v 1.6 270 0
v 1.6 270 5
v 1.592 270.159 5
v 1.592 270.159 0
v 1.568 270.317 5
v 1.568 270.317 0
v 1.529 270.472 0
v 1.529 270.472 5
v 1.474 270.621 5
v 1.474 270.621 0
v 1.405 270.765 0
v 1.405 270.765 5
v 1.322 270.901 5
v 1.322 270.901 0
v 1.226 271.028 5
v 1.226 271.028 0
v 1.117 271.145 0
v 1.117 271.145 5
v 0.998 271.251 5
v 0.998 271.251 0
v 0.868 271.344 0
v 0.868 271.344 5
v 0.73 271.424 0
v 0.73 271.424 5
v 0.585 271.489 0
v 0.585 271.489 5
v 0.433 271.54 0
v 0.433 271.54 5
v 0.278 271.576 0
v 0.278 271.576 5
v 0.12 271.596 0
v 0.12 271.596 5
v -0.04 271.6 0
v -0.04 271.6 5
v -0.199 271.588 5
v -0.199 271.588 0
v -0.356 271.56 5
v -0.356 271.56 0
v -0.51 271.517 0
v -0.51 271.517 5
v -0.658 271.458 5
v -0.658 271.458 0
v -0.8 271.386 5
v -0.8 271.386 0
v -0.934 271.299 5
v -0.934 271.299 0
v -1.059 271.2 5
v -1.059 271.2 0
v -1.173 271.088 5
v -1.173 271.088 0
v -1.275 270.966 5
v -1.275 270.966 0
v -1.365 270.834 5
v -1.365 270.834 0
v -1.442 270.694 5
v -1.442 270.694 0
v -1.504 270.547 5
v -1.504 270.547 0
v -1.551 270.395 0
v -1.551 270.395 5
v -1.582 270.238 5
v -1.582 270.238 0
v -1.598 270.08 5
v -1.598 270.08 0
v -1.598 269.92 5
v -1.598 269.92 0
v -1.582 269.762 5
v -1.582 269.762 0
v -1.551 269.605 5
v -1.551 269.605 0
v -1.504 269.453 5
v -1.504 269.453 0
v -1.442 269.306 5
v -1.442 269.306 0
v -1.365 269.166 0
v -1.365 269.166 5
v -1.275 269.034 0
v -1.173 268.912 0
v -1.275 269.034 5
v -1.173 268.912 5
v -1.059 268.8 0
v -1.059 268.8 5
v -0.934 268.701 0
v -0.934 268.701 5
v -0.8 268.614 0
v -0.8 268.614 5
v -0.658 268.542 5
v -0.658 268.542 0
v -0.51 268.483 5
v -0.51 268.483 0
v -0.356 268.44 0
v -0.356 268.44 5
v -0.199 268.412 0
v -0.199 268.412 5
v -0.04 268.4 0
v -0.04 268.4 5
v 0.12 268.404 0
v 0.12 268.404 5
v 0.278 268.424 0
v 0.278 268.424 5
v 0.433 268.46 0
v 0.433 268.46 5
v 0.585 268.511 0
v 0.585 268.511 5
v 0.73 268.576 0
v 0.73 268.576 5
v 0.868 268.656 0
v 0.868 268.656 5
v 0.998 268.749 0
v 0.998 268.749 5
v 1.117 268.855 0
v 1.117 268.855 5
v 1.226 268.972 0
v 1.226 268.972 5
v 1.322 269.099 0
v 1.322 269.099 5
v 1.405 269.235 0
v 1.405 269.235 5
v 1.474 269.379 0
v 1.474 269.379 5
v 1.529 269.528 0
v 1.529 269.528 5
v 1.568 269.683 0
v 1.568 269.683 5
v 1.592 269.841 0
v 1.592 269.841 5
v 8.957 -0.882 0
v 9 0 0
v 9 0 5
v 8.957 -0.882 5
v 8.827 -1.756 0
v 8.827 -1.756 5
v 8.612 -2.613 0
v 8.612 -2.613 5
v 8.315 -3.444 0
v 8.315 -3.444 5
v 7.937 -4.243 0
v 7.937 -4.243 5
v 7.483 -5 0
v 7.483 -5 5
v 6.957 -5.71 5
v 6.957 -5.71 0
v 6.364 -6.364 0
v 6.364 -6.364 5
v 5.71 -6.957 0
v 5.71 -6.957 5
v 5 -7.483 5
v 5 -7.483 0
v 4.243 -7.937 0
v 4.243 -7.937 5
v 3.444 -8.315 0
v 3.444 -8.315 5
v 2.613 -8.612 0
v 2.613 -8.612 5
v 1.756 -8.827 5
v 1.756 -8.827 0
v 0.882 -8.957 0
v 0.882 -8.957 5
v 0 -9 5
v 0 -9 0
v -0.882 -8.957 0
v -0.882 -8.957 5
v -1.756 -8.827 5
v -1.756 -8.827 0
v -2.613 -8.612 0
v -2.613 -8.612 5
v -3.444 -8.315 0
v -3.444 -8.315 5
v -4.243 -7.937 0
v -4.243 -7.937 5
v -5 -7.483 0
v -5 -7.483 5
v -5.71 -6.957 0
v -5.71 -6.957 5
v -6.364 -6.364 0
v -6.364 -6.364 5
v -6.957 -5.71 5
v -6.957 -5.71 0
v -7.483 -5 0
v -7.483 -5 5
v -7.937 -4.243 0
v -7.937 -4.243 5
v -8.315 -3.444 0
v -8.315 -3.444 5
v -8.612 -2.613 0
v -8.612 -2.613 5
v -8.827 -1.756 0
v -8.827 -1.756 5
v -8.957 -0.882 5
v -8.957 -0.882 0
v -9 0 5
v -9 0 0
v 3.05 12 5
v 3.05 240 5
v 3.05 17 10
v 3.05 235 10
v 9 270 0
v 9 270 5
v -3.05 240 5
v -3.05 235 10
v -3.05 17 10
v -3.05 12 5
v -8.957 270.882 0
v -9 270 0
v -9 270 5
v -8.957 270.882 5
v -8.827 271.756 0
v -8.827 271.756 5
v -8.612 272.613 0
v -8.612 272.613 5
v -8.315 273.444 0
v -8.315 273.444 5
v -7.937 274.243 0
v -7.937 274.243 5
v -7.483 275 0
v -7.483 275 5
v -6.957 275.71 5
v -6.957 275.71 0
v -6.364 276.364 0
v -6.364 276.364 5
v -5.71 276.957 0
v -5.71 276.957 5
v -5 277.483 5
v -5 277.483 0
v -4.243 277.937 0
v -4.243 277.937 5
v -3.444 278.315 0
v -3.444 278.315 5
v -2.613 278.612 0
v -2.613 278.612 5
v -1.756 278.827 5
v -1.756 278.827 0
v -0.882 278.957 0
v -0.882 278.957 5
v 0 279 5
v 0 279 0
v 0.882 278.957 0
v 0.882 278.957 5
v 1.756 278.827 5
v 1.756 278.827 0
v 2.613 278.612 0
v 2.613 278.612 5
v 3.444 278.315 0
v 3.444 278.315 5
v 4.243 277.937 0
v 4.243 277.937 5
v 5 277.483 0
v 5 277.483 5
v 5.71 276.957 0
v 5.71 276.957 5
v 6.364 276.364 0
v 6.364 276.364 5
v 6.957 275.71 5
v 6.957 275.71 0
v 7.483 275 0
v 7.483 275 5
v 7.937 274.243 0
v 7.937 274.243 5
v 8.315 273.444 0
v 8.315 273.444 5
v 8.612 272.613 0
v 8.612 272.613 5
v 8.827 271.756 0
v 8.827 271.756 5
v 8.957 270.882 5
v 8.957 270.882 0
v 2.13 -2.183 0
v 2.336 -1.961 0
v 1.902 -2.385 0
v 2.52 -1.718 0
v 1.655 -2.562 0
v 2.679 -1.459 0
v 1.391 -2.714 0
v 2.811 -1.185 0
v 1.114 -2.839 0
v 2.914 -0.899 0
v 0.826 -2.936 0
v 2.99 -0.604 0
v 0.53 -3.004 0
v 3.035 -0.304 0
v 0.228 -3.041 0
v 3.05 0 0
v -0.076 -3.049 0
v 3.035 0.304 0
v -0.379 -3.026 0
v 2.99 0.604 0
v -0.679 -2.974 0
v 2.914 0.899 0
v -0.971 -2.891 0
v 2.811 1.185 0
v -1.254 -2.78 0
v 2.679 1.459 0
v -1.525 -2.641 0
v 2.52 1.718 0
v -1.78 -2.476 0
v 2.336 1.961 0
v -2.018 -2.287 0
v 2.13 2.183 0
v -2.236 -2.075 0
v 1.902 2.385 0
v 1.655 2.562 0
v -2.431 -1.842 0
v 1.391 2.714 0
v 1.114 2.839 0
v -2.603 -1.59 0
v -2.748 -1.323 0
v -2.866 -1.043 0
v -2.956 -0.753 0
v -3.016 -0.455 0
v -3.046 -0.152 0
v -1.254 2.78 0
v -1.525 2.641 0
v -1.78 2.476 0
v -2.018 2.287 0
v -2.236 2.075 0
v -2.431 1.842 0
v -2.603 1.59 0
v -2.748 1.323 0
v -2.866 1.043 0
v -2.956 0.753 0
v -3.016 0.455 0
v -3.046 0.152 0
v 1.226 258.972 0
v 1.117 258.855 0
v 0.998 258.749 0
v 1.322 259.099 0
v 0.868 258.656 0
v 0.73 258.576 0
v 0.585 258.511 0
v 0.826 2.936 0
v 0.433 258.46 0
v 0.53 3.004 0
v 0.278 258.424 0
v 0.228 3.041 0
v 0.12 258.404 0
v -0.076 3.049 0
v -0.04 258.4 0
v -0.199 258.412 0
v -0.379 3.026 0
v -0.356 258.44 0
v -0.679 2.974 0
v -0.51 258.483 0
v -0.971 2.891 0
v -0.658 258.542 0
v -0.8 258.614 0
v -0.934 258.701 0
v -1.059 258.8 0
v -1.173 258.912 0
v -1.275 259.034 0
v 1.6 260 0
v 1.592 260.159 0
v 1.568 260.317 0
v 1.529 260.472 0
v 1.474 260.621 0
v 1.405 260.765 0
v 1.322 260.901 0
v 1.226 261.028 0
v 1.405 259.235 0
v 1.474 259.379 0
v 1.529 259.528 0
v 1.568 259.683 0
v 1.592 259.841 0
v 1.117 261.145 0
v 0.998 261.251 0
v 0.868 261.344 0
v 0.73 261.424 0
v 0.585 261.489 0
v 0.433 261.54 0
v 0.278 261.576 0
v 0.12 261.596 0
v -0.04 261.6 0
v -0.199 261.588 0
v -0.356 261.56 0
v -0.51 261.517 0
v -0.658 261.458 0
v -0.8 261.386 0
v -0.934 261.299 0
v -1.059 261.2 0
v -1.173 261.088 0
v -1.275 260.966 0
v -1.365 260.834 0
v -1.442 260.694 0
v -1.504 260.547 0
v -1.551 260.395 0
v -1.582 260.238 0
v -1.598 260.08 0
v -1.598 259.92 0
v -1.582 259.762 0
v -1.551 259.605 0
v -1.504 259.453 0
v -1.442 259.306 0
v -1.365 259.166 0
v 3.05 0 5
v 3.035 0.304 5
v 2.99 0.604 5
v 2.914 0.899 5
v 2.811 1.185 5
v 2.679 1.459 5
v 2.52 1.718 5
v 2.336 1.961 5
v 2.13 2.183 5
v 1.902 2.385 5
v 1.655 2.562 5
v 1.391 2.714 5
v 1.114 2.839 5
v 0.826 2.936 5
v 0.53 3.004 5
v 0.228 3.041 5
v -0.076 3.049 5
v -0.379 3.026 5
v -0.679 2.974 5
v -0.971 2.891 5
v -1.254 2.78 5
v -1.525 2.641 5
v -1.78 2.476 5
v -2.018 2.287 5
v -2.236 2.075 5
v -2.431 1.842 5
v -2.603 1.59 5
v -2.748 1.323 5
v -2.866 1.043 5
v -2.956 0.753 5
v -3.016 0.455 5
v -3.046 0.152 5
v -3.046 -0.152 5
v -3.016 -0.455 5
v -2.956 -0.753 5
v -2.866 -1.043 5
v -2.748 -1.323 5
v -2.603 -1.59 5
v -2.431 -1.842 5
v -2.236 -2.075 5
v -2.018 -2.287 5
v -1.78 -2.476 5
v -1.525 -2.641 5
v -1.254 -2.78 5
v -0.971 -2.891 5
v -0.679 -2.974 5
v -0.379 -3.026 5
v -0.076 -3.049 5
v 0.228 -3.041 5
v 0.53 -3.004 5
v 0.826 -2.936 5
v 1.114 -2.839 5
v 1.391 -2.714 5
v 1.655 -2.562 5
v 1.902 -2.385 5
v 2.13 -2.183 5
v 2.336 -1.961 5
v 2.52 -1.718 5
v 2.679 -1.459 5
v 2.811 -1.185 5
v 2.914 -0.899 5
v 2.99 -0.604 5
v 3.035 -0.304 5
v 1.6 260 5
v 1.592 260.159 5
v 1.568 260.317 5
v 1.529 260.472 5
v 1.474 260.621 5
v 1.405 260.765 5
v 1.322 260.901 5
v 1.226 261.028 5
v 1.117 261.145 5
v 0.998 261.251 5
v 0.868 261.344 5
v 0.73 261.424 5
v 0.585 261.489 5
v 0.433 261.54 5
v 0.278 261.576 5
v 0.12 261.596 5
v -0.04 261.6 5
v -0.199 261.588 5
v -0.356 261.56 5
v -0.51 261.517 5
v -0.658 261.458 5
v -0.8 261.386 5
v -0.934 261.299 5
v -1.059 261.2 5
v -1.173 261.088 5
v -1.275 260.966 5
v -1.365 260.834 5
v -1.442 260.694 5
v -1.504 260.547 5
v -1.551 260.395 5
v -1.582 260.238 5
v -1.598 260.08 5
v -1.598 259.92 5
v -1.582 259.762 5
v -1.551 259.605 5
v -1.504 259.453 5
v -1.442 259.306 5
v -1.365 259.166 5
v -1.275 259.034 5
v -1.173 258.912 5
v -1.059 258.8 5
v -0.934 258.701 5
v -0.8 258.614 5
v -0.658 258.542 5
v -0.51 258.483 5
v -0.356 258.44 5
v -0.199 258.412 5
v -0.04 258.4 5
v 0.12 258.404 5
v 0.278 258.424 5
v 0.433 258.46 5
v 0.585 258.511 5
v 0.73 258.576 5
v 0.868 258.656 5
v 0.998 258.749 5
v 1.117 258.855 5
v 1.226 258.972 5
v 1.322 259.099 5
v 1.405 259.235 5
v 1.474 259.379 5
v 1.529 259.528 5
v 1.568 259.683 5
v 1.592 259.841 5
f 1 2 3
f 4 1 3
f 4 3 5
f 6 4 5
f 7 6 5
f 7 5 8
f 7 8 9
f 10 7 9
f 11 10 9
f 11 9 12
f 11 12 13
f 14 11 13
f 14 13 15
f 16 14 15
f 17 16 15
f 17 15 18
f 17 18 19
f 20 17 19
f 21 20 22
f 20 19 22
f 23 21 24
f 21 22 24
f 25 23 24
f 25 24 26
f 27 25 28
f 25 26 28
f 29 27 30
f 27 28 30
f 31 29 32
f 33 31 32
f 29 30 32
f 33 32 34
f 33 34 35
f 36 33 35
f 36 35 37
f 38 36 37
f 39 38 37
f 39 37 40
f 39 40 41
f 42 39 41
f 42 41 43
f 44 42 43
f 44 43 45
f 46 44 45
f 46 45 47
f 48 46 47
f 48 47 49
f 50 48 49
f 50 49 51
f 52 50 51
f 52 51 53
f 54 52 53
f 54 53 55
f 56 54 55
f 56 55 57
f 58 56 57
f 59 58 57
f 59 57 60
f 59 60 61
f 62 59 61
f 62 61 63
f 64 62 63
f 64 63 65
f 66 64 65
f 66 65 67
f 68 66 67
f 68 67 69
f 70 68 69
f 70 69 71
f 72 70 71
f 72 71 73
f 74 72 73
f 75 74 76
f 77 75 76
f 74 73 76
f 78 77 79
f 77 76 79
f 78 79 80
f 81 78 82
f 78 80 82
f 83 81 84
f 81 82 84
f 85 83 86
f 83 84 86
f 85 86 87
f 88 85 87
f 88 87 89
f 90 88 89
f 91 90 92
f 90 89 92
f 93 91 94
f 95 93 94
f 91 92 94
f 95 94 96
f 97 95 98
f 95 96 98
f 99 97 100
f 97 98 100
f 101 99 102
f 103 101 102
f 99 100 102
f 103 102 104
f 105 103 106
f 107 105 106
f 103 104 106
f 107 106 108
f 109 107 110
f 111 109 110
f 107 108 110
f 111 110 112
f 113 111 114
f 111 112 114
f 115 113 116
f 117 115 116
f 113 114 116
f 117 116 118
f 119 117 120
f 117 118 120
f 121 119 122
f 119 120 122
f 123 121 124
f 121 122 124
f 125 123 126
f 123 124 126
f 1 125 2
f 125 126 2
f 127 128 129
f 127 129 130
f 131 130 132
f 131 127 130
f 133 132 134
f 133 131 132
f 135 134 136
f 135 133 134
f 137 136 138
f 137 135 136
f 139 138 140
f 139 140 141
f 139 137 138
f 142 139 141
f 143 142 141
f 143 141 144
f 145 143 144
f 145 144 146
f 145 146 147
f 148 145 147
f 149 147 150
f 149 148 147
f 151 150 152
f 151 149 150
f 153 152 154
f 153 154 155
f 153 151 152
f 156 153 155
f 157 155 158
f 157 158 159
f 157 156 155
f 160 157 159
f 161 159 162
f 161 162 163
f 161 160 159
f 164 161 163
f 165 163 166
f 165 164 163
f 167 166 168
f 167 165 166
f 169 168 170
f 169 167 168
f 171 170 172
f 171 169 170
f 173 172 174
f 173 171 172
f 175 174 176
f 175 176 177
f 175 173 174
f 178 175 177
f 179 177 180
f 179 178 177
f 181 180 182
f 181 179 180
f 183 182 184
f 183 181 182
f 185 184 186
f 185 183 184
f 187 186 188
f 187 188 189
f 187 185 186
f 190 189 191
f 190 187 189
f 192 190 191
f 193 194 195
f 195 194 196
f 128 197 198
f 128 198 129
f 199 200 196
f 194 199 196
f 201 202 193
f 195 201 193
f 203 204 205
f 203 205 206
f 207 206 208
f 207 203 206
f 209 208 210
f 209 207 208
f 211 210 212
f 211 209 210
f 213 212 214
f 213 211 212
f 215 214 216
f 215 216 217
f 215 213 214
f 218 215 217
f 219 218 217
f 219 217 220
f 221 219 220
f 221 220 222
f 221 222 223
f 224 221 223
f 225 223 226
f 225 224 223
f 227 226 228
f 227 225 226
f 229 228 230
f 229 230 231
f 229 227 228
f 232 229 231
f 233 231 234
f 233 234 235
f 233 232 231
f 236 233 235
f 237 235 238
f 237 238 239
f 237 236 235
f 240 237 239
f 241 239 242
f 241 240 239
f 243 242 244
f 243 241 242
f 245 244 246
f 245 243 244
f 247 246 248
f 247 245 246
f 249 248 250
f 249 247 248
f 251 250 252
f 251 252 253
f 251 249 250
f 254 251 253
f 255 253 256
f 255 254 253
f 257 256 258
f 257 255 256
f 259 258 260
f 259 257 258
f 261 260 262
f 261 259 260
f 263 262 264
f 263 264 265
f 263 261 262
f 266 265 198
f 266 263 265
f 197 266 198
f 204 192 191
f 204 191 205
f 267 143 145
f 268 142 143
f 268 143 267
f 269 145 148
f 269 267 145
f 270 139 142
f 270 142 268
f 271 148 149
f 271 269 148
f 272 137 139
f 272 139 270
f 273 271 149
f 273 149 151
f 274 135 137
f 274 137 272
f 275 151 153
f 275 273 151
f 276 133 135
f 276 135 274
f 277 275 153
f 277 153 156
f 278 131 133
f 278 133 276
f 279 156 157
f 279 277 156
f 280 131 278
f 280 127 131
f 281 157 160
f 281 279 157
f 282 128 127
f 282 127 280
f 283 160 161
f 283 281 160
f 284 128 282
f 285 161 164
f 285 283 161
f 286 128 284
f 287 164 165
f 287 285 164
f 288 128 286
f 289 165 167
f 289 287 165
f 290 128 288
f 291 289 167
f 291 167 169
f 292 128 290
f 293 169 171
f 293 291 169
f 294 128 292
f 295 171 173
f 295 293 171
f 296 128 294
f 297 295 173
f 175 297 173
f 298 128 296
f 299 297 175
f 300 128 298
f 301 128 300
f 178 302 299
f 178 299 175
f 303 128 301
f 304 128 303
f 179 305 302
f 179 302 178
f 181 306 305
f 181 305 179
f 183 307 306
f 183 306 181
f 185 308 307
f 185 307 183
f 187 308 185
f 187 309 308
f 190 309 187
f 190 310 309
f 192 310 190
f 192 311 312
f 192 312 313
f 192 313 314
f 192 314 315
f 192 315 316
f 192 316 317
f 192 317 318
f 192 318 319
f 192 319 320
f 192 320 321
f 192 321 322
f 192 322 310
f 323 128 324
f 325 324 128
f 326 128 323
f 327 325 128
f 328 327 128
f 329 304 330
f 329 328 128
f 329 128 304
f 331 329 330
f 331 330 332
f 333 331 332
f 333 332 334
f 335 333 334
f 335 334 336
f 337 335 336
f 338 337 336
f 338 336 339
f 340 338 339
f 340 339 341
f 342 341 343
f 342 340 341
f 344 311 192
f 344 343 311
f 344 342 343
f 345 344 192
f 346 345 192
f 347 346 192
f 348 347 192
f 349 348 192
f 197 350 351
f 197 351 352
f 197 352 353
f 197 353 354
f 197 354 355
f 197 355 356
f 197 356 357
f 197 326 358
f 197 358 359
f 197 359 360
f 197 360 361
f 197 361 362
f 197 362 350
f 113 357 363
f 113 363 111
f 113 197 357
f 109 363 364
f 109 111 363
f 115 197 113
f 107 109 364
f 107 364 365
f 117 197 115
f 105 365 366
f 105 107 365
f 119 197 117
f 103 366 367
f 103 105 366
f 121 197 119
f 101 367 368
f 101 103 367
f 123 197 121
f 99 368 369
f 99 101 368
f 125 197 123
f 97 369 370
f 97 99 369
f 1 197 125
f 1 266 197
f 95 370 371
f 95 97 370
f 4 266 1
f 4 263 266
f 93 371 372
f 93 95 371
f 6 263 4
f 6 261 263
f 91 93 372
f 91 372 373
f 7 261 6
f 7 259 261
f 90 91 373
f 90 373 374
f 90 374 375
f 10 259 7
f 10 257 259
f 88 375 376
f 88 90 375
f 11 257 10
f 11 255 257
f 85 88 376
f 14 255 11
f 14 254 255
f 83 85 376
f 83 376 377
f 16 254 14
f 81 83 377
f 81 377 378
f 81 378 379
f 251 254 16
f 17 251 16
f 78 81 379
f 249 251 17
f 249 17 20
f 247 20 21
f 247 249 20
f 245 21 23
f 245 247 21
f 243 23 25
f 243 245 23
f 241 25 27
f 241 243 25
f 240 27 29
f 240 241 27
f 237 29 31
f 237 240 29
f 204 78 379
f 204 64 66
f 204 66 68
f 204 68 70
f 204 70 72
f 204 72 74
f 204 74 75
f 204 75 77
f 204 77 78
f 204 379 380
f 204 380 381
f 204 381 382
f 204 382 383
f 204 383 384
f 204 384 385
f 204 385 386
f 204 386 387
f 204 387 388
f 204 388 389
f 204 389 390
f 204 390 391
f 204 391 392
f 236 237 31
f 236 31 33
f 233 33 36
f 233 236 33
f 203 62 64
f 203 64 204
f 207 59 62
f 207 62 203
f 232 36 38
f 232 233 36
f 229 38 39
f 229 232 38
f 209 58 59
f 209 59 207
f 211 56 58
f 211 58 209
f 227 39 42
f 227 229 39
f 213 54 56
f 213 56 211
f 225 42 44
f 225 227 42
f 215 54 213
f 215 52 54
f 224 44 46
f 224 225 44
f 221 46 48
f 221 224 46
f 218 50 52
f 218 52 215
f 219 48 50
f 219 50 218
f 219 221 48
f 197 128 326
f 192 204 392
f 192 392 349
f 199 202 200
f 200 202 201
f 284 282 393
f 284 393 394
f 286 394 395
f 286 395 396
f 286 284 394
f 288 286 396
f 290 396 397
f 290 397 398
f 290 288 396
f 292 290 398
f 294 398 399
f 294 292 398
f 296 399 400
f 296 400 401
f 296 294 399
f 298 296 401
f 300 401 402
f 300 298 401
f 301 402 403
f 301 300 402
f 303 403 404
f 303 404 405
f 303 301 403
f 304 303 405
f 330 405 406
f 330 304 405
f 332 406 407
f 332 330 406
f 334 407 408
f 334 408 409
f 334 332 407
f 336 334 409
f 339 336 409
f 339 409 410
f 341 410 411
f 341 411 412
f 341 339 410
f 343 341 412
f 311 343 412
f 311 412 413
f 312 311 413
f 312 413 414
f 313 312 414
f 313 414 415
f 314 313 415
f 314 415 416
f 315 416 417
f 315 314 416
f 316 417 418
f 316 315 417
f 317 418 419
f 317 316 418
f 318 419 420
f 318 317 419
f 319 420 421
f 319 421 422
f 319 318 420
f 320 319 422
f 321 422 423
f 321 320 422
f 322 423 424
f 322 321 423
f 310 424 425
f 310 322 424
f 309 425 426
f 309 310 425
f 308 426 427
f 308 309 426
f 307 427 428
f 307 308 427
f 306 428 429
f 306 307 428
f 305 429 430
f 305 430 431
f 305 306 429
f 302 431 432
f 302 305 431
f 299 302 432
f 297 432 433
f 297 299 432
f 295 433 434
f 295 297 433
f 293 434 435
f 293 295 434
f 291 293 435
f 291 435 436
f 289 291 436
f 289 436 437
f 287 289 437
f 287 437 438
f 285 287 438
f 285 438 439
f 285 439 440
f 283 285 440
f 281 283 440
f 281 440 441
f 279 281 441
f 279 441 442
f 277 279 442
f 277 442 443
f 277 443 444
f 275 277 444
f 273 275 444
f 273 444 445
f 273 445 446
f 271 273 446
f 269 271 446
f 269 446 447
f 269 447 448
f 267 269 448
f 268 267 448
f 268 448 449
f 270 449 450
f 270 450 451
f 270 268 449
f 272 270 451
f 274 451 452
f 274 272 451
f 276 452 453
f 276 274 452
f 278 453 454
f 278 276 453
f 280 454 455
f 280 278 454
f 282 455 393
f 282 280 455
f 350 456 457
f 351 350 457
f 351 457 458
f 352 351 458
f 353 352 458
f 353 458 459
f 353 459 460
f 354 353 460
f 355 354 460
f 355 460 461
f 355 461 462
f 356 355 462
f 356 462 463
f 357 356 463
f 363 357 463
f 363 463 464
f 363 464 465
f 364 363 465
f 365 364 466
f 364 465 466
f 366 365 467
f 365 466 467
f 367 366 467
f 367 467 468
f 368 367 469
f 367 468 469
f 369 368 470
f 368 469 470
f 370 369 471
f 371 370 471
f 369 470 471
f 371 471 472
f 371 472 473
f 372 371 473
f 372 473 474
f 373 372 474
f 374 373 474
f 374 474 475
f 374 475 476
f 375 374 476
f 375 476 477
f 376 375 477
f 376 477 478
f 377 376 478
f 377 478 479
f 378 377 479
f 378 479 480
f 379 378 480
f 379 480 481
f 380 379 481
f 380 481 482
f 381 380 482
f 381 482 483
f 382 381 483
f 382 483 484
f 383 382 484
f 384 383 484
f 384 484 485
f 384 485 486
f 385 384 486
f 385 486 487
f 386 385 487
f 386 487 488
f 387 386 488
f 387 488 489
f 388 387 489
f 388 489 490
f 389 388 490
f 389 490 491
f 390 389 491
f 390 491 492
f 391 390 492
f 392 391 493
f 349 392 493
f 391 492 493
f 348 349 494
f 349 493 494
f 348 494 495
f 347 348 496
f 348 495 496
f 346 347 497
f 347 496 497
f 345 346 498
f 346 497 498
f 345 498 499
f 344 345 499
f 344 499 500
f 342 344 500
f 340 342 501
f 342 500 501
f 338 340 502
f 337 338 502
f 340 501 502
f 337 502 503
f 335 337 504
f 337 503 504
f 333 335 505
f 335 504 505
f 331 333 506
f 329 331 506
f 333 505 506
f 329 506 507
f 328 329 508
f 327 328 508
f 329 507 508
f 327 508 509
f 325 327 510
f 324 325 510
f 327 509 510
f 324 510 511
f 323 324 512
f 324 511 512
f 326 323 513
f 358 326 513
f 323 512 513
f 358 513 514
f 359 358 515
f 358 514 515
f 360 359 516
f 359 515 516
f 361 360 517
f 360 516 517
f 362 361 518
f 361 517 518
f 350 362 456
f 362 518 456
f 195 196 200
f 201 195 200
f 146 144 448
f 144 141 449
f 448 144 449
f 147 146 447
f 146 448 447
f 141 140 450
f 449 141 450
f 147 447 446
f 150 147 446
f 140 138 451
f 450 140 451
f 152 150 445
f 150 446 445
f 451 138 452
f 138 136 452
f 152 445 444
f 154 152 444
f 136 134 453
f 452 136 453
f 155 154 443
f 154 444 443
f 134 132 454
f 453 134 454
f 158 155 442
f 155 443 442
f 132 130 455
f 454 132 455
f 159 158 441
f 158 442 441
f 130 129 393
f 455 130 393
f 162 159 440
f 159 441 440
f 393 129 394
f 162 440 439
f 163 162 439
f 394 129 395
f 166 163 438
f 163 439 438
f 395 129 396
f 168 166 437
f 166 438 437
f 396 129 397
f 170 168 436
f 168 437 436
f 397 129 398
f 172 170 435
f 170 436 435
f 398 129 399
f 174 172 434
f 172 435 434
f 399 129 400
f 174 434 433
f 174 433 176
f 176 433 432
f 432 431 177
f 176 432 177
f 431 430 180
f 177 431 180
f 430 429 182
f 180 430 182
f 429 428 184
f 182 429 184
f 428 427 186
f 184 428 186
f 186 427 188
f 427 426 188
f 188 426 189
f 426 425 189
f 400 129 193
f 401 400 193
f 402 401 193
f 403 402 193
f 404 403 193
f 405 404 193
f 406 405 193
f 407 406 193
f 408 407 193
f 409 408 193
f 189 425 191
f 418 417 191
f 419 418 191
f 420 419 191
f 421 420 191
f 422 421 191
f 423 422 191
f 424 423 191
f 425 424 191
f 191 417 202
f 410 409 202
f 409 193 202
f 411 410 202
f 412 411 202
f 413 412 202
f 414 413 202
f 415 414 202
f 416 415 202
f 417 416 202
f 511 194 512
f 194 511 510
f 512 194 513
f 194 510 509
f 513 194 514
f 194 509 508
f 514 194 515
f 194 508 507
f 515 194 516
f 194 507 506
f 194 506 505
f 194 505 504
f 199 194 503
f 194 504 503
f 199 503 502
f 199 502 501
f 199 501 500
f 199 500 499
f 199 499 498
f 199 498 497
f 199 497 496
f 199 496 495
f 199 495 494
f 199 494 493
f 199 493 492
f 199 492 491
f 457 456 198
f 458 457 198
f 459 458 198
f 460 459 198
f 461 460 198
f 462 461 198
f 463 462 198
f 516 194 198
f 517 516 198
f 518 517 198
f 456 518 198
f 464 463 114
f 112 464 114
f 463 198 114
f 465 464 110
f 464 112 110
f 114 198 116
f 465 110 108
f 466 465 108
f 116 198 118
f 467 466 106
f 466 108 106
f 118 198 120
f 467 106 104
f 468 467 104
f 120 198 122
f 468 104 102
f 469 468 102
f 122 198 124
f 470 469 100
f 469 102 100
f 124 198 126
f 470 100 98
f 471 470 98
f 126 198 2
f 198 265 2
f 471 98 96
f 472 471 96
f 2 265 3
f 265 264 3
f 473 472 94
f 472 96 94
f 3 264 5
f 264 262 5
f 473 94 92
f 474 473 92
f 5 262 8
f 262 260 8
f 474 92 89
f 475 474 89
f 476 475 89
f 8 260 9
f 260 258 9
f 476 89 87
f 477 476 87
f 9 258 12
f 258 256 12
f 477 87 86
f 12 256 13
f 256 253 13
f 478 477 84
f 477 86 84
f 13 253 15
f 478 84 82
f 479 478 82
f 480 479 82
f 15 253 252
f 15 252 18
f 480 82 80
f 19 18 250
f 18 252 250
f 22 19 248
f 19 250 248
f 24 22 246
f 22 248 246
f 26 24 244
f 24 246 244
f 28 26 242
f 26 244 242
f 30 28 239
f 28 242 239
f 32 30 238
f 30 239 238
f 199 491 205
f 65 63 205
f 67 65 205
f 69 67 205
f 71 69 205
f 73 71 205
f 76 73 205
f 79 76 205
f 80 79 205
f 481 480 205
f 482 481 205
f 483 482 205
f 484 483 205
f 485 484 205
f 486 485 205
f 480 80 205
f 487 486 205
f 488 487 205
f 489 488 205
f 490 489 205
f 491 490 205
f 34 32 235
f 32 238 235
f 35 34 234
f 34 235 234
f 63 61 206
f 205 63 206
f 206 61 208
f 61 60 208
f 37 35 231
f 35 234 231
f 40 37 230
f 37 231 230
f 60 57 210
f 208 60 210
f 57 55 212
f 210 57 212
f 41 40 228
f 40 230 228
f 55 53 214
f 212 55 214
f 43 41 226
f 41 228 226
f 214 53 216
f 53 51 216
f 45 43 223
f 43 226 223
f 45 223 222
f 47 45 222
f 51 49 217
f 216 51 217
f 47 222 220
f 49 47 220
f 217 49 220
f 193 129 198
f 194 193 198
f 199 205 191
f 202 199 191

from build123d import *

# Parameters (mm, degrees)
SKETCH1_R           = 3.05
BOSS_EXTRUDE1_DEPTH = 5
SKETCH2_R           = 1.6
CUT_EXTRUDE1_DEPTH  = 10
BOSS_EXTRUDE2_DEPTH = 5
CHAMFER1_SIZE       = 5


with BuildPart() as part:
    # Sketch1 → Boss-Extrude1 (new body)
    with BuildSketch(Plane.XY):
        with BuildLine():
            Line((9, 270), (9, 0))
            ThreePointArc((9, 0), (0, -9), (-9, 0))
            Line((-9, 0), (-9, 270))
            ThreePointArc((-9, 270), (0, 279), (9, 270))
        make_face()
        Circle(SKETCH1_R, mode=Mode.SUBTRACT)
    extrude(amount=BOSS_EXTRUDE1_DEPTH)

    # Sketch2 → Cut-Extrude1 (cut)
    with BuildSketch(Plane.XY.offset(5)):
        with Locations((0, 270)):
            Circle(SKETCH2_R)
        with Locations((0, 260)):
            Circle(SKETCH2_R)
    extrude(amount=-CUT_EXTRUDE1_DEPTH, mode=Mode.SUBTRACT)

    # Sketch3 → Boss-Extrude2 (add)
    with BuildSketch(Plane.XY.offset(5)):
        Polygon((-3.05, 12), (-3.05, 240), (3.05, 240), (3.05, 12), (0, 12), align=None)
    extrude(amount=BOSS_EXTRUDE2_DEPTH)

    # Chamfer1
    chamfer1_edges = [part.edges().sort_by_distance(p)[0] for p in [
        (0, 240, 10),
        (0, 12, 10),
    ]]
    chamfer(chamfer1_edges, length=CHAMFER1_SIZE - 0.0001)  # a hair under: the kernel refuses the full size


solid = part.part
